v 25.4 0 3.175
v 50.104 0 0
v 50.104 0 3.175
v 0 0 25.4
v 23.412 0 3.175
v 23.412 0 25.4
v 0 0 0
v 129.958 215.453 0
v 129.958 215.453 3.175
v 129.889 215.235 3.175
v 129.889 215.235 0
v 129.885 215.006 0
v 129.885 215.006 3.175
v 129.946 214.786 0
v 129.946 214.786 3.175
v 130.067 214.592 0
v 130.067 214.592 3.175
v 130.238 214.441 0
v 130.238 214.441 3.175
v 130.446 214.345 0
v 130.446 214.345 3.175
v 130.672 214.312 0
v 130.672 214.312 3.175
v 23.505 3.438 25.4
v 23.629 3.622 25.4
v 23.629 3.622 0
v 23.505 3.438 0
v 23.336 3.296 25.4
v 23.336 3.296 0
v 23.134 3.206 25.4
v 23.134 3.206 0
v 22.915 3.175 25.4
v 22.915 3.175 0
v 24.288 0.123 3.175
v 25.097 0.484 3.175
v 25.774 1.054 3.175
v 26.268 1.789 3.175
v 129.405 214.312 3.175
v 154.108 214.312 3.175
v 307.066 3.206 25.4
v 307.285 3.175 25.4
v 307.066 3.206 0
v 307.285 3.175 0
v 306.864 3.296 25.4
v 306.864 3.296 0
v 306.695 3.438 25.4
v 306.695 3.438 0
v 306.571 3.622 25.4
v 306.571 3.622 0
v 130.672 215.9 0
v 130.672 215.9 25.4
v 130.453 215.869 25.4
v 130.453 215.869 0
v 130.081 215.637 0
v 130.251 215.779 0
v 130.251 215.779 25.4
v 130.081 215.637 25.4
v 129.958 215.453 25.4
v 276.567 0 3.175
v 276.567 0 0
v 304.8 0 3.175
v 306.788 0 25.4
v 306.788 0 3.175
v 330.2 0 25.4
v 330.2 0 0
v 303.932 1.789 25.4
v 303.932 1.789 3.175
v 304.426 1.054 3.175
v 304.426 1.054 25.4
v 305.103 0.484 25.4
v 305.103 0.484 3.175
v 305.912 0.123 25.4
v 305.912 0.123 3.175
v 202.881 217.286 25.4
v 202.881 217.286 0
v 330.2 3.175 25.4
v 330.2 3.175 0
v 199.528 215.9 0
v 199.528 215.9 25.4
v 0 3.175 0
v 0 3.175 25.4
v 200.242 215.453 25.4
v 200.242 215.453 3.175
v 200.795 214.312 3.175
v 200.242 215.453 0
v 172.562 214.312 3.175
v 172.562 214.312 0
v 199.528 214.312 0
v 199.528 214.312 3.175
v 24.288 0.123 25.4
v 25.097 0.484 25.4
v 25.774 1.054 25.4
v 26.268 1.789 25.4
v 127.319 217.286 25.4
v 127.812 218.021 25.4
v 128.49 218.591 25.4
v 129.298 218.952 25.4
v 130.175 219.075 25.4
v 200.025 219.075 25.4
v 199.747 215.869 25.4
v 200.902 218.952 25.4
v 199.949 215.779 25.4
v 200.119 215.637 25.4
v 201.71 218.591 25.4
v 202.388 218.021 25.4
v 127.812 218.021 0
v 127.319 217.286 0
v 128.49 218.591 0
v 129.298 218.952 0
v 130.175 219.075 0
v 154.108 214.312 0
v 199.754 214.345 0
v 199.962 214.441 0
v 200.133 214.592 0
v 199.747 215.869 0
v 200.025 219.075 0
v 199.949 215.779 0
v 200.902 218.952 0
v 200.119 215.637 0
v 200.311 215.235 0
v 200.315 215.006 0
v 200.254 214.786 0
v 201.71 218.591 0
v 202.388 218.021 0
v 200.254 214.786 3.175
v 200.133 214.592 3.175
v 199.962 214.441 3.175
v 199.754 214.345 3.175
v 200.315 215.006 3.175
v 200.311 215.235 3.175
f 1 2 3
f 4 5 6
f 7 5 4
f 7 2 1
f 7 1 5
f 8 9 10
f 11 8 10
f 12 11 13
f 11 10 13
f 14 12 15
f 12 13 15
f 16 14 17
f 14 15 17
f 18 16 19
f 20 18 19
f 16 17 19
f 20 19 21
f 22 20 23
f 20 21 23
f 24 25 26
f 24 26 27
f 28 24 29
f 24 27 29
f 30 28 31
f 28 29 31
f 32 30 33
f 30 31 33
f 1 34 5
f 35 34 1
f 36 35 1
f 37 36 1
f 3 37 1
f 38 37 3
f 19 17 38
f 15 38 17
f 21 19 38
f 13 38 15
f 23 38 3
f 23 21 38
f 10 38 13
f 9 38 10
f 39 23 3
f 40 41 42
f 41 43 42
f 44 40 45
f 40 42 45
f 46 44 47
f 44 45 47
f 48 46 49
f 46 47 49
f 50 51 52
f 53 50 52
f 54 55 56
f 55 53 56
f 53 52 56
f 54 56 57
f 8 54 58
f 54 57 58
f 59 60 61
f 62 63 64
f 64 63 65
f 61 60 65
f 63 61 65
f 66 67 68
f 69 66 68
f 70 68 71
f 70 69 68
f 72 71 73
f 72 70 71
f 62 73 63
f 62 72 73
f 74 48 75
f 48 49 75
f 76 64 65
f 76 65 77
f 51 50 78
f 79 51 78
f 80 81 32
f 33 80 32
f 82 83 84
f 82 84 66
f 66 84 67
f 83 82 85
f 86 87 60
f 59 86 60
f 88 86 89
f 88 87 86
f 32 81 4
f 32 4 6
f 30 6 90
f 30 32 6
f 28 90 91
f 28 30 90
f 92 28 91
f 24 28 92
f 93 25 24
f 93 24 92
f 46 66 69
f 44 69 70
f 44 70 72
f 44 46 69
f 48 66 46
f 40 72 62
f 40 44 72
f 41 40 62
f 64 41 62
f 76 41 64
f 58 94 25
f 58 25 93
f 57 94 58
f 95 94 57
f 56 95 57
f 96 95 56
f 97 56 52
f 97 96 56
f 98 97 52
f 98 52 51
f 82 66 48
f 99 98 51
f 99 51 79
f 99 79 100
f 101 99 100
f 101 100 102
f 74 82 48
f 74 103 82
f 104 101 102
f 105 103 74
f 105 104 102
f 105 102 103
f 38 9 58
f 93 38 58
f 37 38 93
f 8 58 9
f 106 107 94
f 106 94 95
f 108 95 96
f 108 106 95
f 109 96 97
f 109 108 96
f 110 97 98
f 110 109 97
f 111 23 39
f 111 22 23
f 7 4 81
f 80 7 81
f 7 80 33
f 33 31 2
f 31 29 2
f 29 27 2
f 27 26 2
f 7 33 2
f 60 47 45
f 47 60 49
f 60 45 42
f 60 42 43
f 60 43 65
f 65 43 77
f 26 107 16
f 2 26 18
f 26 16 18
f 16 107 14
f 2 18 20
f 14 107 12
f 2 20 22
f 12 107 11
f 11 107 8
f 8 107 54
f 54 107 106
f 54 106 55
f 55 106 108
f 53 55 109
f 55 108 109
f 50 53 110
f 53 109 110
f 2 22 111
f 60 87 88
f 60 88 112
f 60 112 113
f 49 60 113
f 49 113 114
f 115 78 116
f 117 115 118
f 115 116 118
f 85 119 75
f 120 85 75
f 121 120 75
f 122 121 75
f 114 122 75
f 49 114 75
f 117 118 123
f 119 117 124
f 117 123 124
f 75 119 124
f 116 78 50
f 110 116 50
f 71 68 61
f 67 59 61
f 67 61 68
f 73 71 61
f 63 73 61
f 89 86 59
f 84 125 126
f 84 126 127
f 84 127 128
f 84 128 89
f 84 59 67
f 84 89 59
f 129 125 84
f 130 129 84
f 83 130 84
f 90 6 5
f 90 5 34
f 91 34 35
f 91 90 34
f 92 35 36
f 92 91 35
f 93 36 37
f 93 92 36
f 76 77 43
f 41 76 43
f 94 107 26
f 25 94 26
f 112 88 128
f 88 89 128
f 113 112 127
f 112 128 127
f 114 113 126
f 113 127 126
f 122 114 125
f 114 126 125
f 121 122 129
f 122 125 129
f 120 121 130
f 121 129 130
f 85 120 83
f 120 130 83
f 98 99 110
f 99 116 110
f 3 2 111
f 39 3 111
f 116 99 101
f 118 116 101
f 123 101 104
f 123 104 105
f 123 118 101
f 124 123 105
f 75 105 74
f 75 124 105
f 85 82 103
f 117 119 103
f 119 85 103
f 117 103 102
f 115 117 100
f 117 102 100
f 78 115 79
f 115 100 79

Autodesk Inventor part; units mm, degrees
ref_plane "YZ Plane" through (0, 0, 0) normal (1, 0, 0) x (0, 1, 0)
ref_plane "XZ Plane" through (0, 0, 0) normal (0, 1, 0) x (-1, 0, 0)
ref_plane "XY Plane" through (0, 0, 0) normal (0, 0, 1) x (1, 0, 0)
sketch "Sketch1" plane through (0, 0, 0) normal (0, 0, 1) x (1, 0, 0)
  line L0 (130.175, 215.9) -> (200.025, 215.9)
  line L1 (130.175, 215.9) -> (25.4, 0)
  line L2 (200.025, 215.9) -> (304.8, 0)
  line L3 (306.7883, 3.175) -> (202.0133, 219.075)
  line L4 (202.0133, 219.075) -> (128.1867, 219.075)
  line L5 (128.1867, 219.075) -> (23.4117, 3.175)
  line L6 (25.4, 0) -> (50.1039, 0)
  line L7 (50.1039, 0) -> (154.1085, 214.3125)
  line L8 (172.5624, 214.3125) -> (276.567, 0)
  line L9 (276.567, 0) -> (304.8, 0)
  line L10 (129.4046, 214.3125) -> (154.1085, 214.3125)
  line L11 (172.5624, 214.3125) -> (200.7954, 214.3125)
  line L12 (50.1039, 0) -> (276.567, 0) construction
  line L13 (25.4, 0) -> (0, 0)
  line L14 (0, 0) -> (0, 3.175)
  line L15 (0, 3.175) -> (23.4117, 3.175)
  line L16 (304.8, 0) -> (330.2, 0)
  line L17 (330.2, 0) -> (330.2, 3.175)
  line L18 (330.2, 3.175) -> (306.7883, 3.175)
  dimension "d1" = 69.85
  dimension "d5" = 3.175
  dimension "d34" = 22.225
  dimension "d35" = 25.4
  dimension "d37" = 1.5875
  dimension "d41" = 3.175
  dimension "d43" = 219.075
  dimension "d44" = 3.175
  dimension "d45" = 64.113
  dimension "d46" = 64.113
  dimension "d47" = 3.175
  dimension "d48" = 25.4
  dimension "d49" = 25.4
  dimension "d50" = 330.2
extrude "Extrusion1" add sketch "Sketch1" along normal blind 25.4 contours L1 L13 L14 L15 L5 L4 L3 L18 L17 L16 L2 L0
extrude "Extrusion2" add sketch "Sketch1" along normal blind 3.175
fillet "Fillet1" radius 0.7937 6 edges at (130.175, 215.9, 12.7) (200.025, 215.9, 12.7) (200.7954, 214.3125, 1.5875) (129.4046, 214.3125, 1.5875) (23.4117, 3.175, 12.7) (306.7883, 3.175, 12.7)
fillet "Fillet2" radius 3.175 4 edges at (128.1867, 219.075, 12.7) (202.0133, 219.075, 12.7) (25.4, 0, 14.2875) (304.8, 0, 14.2875)
equation "\"d5\" = d4"
equation "\"d37\" = d36"
equation "\"d44\" = d41"
equation "\"d45\" = d46"
equation "\"d47\" = d41"
equation "\"d49\" = d48"
equation "\"d36\" = 0.5 * d5"
equation "\"d4\" = 3.175"
properties part number "8 ball lift frame"
